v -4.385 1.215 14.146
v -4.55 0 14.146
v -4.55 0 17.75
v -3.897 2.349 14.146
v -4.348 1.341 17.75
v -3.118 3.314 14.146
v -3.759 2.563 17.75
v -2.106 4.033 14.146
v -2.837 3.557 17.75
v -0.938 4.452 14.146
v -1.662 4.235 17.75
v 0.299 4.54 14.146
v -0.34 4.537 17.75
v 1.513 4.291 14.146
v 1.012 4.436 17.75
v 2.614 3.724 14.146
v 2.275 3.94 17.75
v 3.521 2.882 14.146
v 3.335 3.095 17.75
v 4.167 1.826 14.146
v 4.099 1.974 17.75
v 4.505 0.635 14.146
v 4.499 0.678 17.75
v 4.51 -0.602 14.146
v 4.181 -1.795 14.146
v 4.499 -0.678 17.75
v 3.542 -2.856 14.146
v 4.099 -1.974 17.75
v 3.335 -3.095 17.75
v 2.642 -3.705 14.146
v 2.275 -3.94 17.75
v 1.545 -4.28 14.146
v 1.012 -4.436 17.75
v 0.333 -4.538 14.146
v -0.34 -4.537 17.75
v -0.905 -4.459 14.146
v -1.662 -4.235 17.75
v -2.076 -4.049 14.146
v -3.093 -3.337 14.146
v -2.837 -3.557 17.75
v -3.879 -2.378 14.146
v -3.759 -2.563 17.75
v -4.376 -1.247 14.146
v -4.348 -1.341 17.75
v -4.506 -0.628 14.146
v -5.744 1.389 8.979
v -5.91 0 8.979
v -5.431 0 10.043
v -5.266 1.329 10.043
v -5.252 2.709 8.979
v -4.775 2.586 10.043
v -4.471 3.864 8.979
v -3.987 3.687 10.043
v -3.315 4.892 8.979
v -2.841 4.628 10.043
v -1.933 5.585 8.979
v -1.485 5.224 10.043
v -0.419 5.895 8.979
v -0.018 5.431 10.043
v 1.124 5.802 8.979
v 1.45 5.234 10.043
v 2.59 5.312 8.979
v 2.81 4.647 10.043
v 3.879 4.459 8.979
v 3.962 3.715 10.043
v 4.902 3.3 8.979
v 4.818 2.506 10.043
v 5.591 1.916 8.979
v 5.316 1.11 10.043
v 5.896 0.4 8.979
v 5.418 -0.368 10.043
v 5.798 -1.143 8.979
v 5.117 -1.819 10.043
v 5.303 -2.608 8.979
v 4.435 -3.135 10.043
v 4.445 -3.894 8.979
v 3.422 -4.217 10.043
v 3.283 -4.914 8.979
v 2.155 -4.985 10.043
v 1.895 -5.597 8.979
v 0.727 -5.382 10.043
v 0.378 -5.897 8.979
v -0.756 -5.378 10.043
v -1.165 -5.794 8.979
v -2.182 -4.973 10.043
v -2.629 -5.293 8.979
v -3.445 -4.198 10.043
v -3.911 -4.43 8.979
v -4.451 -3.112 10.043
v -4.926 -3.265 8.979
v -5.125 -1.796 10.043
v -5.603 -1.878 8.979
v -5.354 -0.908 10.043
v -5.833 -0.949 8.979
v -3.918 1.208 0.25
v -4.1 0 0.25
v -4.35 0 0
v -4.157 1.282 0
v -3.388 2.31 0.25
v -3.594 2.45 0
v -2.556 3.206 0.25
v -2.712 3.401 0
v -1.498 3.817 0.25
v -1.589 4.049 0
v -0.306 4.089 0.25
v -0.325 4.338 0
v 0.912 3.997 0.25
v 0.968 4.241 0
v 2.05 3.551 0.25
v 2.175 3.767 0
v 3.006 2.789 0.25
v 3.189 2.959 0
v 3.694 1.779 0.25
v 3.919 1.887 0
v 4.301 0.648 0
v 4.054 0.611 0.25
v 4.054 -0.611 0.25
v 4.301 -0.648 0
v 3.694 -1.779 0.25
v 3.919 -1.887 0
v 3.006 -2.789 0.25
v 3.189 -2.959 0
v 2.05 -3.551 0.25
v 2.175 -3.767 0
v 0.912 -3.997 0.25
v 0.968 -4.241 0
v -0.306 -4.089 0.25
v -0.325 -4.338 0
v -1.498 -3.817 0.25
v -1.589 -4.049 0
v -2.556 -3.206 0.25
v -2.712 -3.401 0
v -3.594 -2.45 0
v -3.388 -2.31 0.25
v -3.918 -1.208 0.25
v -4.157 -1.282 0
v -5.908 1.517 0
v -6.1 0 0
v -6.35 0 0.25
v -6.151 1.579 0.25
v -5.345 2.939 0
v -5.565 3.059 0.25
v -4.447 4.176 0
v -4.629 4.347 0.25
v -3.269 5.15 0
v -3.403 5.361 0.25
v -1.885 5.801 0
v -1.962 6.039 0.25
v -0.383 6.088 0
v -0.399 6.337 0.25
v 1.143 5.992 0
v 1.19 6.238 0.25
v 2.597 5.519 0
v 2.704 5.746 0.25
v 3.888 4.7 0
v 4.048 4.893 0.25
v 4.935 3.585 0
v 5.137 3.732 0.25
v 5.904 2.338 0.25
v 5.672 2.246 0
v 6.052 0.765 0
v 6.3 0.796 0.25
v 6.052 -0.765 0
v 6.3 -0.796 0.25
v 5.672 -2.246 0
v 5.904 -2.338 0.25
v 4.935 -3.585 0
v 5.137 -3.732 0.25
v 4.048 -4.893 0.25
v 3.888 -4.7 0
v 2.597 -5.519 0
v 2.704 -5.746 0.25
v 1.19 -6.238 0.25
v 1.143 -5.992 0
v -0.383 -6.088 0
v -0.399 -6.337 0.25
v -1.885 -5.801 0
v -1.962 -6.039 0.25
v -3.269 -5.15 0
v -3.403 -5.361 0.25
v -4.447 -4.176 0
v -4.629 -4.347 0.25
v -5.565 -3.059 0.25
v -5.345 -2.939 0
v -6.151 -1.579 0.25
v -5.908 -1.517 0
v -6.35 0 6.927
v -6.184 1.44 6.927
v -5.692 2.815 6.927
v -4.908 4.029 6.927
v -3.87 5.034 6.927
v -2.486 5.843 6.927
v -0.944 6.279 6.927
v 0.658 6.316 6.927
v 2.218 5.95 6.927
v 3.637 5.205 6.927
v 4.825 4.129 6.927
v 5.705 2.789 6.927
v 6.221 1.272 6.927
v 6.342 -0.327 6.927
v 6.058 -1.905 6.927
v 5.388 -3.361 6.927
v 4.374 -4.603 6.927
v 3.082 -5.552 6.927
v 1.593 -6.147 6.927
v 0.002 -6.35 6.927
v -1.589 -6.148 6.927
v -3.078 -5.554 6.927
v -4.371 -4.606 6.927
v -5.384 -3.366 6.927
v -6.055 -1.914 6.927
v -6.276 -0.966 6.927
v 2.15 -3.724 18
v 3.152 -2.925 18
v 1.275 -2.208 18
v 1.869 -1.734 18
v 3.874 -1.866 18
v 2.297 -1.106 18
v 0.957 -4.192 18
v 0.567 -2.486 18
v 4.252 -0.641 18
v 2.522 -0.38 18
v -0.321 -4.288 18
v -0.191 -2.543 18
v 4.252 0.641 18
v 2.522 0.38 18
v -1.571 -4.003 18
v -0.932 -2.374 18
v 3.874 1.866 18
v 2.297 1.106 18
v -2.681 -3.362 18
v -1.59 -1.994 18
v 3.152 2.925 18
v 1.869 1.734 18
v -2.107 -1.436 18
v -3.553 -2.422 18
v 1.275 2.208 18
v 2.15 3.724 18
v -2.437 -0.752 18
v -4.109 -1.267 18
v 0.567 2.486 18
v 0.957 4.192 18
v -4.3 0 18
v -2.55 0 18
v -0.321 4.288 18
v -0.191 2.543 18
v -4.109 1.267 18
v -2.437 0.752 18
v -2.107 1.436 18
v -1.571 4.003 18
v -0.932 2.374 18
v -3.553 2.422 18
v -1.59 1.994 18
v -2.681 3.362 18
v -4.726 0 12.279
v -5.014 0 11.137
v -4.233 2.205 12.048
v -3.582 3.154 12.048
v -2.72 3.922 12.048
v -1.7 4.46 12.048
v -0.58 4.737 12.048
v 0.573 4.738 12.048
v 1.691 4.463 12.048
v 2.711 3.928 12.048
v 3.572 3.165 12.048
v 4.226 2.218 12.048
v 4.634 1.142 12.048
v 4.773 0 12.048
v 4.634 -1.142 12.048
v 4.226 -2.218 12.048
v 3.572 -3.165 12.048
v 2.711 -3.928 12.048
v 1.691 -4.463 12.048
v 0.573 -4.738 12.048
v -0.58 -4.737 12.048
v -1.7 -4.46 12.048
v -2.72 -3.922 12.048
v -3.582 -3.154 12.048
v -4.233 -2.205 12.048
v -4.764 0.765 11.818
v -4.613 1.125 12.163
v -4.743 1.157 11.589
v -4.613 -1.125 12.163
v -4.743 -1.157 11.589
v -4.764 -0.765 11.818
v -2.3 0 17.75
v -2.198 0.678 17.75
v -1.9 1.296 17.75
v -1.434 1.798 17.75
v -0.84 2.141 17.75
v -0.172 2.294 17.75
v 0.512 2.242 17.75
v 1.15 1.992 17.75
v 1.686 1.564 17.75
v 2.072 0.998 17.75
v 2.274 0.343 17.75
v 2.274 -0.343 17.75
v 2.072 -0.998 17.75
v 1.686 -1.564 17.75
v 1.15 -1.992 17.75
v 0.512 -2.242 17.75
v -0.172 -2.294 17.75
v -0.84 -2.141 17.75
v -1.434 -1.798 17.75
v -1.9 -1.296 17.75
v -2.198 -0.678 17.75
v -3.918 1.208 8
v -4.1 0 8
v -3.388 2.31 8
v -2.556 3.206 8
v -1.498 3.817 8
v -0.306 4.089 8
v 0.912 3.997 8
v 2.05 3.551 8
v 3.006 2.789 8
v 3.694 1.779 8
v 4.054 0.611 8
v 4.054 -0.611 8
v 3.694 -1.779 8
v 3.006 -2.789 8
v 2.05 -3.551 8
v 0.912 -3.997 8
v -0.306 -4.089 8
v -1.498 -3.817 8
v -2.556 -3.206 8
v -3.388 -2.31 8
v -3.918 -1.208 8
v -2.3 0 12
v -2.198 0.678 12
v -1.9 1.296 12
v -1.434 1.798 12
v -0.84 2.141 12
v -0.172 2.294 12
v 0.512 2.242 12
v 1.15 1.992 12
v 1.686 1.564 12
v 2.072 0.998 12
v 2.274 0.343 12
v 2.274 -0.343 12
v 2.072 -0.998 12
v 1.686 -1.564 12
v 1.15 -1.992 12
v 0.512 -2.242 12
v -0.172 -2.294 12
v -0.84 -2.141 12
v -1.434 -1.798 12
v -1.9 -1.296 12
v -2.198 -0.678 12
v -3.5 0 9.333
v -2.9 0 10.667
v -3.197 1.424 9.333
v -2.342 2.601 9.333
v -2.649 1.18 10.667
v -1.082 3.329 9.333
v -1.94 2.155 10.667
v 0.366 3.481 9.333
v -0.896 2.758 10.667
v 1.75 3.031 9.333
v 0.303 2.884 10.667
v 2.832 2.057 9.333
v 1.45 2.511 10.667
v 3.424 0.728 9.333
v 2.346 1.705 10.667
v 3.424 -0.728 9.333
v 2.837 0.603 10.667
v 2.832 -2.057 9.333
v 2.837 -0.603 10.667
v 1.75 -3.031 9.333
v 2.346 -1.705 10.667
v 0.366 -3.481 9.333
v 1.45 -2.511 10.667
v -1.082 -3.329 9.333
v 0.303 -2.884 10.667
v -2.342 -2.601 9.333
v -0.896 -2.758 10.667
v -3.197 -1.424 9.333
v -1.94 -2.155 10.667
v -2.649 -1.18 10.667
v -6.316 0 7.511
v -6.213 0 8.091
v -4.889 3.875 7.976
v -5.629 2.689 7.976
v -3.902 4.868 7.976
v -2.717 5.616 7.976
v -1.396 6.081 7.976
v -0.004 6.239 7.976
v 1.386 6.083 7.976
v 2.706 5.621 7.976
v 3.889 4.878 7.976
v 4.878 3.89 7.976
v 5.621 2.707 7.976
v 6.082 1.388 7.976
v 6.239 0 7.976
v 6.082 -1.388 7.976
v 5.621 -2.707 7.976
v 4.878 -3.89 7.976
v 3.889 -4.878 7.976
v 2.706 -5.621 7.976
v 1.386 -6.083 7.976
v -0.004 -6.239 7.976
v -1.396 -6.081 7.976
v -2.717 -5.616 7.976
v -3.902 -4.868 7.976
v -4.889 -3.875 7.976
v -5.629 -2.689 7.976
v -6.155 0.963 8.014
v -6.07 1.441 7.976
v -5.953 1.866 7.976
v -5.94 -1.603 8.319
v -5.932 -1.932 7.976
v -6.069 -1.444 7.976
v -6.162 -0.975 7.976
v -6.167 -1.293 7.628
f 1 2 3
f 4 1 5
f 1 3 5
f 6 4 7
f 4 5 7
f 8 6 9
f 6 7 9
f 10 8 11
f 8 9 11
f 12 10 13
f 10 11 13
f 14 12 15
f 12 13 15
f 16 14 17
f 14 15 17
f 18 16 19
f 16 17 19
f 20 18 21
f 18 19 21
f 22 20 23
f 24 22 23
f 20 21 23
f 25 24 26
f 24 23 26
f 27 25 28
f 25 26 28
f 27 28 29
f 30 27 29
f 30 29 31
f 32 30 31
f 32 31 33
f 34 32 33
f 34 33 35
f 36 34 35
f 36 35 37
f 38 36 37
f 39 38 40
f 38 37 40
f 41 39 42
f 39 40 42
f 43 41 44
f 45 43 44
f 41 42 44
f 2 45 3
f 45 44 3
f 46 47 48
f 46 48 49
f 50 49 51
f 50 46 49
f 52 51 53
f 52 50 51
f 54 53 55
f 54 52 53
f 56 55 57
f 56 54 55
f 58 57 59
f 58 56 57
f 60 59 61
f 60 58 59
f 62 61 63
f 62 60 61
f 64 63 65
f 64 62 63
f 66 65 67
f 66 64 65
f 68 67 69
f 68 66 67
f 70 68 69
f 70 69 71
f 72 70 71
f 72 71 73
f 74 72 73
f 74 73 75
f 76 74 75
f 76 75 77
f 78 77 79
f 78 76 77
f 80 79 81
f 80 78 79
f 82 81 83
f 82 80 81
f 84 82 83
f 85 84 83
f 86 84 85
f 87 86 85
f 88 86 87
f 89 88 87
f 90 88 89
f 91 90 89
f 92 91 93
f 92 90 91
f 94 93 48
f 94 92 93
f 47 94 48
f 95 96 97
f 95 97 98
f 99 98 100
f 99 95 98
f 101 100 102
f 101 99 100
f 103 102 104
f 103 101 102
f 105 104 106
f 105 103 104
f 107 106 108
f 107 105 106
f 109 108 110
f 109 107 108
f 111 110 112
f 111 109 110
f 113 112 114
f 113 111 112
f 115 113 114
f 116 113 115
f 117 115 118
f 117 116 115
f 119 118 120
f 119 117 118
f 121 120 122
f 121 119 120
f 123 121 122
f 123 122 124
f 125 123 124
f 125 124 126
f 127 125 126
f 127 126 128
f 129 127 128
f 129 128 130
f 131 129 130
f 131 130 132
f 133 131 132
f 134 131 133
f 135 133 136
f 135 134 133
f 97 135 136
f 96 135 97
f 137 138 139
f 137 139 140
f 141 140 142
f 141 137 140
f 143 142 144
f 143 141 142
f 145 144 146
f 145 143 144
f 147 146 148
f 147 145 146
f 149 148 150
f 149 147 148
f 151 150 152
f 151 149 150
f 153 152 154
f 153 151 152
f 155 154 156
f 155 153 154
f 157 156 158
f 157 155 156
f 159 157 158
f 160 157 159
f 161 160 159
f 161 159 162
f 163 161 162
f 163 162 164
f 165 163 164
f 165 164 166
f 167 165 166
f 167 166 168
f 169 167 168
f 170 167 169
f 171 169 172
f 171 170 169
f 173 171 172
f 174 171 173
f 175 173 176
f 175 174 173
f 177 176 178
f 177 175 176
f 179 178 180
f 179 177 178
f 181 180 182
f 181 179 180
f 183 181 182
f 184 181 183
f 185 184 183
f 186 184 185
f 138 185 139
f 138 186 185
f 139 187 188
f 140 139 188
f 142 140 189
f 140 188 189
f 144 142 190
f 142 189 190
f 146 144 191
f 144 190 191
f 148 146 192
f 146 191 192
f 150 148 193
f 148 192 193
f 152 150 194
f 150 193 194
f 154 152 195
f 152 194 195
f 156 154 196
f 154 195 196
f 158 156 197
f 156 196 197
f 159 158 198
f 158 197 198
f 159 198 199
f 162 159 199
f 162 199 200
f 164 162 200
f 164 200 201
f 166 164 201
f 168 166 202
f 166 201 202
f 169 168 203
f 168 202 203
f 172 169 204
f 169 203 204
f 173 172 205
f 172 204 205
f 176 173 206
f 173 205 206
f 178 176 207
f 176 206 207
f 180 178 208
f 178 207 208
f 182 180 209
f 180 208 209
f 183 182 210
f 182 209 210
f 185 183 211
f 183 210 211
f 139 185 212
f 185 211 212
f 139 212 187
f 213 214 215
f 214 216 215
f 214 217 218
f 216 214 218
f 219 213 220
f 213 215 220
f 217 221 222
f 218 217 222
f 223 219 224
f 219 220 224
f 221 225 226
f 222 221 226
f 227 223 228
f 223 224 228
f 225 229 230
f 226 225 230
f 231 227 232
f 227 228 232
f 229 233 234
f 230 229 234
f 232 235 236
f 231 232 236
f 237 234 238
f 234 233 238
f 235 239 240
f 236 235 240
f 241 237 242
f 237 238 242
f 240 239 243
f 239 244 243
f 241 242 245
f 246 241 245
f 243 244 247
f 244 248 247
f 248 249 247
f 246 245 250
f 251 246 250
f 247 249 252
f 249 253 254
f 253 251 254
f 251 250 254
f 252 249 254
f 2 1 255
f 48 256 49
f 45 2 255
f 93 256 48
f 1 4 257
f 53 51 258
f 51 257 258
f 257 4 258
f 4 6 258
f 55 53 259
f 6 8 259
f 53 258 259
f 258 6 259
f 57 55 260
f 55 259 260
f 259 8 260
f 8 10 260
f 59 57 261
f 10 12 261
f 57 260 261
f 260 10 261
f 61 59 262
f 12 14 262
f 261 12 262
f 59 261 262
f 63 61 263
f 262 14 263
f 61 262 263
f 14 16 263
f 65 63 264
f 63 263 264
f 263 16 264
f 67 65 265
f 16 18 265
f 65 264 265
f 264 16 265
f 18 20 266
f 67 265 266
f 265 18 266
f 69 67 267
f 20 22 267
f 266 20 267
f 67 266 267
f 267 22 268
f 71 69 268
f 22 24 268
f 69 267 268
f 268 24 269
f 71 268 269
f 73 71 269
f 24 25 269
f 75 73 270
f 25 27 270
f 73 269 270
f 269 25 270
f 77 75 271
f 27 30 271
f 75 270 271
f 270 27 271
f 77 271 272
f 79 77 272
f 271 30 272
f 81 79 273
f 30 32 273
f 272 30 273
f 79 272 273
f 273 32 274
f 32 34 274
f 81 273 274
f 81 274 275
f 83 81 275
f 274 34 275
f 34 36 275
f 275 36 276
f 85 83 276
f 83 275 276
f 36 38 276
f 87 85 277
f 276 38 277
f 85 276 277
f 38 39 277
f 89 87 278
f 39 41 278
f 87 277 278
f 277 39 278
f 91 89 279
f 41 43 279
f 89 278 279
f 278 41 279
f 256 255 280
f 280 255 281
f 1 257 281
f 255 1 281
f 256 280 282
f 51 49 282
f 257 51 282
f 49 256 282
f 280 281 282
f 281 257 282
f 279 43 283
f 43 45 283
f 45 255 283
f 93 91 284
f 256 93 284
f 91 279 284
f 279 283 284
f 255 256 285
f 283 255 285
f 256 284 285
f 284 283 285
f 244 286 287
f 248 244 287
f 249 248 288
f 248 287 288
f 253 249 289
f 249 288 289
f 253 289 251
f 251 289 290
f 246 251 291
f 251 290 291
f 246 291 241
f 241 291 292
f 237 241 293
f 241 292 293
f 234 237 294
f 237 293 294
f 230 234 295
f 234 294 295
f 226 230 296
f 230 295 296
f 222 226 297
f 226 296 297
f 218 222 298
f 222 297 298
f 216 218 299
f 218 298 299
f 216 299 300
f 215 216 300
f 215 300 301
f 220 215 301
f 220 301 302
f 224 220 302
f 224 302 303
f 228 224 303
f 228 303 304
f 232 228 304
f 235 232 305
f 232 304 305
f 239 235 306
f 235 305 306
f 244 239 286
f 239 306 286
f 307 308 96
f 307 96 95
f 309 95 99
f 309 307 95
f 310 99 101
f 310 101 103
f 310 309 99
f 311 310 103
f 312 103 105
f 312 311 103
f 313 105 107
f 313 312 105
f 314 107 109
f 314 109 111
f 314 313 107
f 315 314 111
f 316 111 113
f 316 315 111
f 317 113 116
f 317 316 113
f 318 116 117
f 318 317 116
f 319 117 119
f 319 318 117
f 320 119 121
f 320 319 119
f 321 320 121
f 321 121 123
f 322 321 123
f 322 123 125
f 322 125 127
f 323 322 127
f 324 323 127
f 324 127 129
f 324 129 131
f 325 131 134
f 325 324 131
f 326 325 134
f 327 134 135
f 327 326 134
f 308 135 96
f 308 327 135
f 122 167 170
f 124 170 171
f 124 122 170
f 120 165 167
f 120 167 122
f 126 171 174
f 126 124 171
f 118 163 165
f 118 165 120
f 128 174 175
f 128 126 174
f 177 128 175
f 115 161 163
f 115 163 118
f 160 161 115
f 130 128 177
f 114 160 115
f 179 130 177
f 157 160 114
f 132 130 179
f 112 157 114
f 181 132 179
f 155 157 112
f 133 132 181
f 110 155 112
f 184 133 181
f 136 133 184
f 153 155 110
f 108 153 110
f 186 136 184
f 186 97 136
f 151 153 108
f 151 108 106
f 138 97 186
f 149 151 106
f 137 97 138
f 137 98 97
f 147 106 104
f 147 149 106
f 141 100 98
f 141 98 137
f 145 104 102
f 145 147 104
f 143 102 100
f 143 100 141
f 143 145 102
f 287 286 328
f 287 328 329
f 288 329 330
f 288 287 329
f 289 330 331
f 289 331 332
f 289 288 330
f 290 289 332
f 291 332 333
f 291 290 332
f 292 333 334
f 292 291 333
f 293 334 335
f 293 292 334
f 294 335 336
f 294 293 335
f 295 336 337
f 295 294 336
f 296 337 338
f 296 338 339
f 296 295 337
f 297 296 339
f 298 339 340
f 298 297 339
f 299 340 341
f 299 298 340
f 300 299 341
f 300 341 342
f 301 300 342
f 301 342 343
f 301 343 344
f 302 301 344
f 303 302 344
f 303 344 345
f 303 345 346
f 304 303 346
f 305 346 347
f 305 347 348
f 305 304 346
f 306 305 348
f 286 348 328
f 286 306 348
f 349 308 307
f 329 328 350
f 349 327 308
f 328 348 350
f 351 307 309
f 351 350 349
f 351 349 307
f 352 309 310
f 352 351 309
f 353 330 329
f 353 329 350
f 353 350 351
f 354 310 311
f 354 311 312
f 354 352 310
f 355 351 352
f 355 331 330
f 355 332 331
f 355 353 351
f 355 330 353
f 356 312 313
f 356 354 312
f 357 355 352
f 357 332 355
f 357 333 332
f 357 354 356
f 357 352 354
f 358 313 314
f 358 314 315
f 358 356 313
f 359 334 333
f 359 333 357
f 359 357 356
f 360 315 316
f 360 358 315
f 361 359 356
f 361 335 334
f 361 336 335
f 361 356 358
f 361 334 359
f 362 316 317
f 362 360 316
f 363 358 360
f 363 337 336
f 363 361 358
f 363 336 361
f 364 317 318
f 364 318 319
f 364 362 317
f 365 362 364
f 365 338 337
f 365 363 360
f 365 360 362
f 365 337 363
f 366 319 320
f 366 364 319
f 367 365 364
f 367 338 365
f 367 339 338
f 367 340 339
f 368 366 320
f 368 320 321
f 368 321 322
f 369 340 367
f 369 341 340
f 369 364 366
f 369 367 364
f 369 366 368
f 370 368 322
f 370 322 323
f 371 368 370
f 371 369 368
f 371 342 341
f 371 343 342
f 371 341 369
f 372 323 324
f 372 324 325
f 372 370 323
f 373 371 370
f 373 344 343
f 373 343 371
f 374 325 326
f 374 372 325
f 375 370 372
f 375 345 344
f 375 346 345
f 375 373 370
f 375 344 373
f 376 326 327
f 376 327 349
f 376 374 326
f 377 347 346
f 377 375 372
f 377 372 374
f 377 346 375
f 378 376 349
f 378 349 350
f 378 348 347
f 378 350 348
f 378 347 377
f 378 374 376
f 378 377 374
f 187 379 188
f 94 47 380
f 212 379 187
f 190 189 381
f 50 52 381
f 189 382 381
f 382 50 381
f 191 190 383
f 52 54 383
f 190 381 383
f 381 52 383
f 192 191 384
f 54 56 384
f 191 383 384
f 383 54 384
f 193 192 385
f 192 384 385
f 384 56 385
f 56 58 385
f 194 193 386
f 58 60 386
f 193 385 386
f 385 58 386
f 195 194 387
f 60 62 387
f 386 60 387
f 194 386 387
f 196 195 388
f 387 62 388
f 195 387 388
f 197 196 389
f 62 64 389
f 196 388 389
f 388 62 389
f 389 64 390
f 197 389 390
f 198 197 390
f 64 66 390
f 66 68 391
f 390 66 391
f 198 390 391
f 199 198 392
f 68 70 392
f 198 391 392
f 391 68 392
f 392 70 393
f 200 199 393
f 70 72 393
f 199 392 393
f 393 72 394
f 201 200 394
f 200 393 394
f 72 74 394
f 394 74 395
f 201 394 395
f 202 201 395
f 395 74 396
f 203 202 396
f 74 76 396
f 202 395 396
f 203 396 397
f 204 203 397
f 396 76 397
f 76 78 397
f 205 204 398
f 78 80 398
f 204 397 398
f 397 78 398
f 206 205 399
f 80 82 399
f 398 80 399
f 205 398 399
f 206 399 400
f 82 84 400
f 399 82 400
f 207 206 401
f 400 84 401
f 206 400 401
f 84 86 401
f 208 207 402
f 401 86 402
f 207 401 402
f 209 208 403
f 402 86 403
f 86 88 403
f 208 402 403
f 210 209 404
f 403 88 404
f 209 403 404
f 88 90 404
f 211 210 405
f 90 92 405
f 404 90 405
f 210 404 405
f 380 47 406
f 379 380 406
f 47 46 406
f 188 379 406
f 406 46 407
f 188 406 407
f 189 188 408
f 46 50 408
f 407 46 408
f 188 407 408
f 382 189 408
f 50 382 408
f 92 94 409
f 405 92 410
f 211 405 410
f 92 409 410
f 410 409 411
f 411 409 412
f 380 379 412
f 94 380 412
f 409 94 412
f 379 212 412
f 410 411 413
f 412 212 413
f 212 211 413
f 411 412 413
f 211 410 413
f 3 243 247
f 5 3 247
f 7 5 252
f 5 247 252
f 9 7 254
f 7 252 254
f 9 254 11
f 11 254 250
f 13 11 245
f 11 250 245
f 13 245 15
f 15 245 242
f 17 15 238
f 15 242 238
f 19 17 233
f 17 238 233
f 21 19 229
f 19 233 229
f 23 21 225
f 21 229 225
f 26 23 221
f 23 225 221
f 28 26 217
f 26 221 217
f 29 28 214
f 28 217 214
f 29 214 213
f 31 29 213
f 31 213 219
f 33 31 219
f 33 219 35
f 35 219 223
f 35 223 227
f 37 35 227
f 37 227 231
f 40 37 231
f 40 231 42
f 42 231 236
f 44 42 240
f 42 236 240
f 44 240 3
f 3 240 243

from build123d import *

# Parameters (mm, degrees)
F0_W    = 2.25
F0_H    = 6
F0_H_2  = 8
F2_SIZE = 0.25
F3_SIZE = 0.25
F4_R    = 10
F5_R    = 5


with BuildPart() as f1:
    # F0 (on Front) → F1 (revolve)
    with BuildSketch(Plane.XZ):
        with Locations((-3.425, 15)):
            Rectangle(F0_W, F0_H)
        Polygon((-6.35, 8), (-4.1, 8), (-2.3, 12), (-4.55, 12), align=None)
        with Locations((-5.225, 4)):
            Rectangle(F0_W, F0_H_2)
    revolve(axis=Axis((0, 0, 11.346421), (0, 0, -1)))

    # F2
    f2_edges = [f1.edges().sort_by_distance(p)[0] for p in [
        (6.35, 0, 0),
        (4.1, 0, 0),
    ]]
    chamfer(f2_edges, length=F2_SIZE)

    # F3
    f3_edges = [f1.edges().sort_by_distance(p)[0] for p in [
        (2.3, 0, 18),
        (4.55, 0, 18),
    ]]
    chamfer(f3_edges, length=F3_SIZE)

    # F4
    f4_edges = [f1.edges().sort_by_distance(p)[0] for p in [
        (4.55, 0, 12),
    ]]
    fillet(f4_edges, radius=F4_R)

    # F5
    f5_edges = [f1.edges().sort_by_distance(p)[0] for p in [
        (6.35, 0, 8),
    ]]
    fillet(f5_edges, radius=F5_R)


solid = f1.part
